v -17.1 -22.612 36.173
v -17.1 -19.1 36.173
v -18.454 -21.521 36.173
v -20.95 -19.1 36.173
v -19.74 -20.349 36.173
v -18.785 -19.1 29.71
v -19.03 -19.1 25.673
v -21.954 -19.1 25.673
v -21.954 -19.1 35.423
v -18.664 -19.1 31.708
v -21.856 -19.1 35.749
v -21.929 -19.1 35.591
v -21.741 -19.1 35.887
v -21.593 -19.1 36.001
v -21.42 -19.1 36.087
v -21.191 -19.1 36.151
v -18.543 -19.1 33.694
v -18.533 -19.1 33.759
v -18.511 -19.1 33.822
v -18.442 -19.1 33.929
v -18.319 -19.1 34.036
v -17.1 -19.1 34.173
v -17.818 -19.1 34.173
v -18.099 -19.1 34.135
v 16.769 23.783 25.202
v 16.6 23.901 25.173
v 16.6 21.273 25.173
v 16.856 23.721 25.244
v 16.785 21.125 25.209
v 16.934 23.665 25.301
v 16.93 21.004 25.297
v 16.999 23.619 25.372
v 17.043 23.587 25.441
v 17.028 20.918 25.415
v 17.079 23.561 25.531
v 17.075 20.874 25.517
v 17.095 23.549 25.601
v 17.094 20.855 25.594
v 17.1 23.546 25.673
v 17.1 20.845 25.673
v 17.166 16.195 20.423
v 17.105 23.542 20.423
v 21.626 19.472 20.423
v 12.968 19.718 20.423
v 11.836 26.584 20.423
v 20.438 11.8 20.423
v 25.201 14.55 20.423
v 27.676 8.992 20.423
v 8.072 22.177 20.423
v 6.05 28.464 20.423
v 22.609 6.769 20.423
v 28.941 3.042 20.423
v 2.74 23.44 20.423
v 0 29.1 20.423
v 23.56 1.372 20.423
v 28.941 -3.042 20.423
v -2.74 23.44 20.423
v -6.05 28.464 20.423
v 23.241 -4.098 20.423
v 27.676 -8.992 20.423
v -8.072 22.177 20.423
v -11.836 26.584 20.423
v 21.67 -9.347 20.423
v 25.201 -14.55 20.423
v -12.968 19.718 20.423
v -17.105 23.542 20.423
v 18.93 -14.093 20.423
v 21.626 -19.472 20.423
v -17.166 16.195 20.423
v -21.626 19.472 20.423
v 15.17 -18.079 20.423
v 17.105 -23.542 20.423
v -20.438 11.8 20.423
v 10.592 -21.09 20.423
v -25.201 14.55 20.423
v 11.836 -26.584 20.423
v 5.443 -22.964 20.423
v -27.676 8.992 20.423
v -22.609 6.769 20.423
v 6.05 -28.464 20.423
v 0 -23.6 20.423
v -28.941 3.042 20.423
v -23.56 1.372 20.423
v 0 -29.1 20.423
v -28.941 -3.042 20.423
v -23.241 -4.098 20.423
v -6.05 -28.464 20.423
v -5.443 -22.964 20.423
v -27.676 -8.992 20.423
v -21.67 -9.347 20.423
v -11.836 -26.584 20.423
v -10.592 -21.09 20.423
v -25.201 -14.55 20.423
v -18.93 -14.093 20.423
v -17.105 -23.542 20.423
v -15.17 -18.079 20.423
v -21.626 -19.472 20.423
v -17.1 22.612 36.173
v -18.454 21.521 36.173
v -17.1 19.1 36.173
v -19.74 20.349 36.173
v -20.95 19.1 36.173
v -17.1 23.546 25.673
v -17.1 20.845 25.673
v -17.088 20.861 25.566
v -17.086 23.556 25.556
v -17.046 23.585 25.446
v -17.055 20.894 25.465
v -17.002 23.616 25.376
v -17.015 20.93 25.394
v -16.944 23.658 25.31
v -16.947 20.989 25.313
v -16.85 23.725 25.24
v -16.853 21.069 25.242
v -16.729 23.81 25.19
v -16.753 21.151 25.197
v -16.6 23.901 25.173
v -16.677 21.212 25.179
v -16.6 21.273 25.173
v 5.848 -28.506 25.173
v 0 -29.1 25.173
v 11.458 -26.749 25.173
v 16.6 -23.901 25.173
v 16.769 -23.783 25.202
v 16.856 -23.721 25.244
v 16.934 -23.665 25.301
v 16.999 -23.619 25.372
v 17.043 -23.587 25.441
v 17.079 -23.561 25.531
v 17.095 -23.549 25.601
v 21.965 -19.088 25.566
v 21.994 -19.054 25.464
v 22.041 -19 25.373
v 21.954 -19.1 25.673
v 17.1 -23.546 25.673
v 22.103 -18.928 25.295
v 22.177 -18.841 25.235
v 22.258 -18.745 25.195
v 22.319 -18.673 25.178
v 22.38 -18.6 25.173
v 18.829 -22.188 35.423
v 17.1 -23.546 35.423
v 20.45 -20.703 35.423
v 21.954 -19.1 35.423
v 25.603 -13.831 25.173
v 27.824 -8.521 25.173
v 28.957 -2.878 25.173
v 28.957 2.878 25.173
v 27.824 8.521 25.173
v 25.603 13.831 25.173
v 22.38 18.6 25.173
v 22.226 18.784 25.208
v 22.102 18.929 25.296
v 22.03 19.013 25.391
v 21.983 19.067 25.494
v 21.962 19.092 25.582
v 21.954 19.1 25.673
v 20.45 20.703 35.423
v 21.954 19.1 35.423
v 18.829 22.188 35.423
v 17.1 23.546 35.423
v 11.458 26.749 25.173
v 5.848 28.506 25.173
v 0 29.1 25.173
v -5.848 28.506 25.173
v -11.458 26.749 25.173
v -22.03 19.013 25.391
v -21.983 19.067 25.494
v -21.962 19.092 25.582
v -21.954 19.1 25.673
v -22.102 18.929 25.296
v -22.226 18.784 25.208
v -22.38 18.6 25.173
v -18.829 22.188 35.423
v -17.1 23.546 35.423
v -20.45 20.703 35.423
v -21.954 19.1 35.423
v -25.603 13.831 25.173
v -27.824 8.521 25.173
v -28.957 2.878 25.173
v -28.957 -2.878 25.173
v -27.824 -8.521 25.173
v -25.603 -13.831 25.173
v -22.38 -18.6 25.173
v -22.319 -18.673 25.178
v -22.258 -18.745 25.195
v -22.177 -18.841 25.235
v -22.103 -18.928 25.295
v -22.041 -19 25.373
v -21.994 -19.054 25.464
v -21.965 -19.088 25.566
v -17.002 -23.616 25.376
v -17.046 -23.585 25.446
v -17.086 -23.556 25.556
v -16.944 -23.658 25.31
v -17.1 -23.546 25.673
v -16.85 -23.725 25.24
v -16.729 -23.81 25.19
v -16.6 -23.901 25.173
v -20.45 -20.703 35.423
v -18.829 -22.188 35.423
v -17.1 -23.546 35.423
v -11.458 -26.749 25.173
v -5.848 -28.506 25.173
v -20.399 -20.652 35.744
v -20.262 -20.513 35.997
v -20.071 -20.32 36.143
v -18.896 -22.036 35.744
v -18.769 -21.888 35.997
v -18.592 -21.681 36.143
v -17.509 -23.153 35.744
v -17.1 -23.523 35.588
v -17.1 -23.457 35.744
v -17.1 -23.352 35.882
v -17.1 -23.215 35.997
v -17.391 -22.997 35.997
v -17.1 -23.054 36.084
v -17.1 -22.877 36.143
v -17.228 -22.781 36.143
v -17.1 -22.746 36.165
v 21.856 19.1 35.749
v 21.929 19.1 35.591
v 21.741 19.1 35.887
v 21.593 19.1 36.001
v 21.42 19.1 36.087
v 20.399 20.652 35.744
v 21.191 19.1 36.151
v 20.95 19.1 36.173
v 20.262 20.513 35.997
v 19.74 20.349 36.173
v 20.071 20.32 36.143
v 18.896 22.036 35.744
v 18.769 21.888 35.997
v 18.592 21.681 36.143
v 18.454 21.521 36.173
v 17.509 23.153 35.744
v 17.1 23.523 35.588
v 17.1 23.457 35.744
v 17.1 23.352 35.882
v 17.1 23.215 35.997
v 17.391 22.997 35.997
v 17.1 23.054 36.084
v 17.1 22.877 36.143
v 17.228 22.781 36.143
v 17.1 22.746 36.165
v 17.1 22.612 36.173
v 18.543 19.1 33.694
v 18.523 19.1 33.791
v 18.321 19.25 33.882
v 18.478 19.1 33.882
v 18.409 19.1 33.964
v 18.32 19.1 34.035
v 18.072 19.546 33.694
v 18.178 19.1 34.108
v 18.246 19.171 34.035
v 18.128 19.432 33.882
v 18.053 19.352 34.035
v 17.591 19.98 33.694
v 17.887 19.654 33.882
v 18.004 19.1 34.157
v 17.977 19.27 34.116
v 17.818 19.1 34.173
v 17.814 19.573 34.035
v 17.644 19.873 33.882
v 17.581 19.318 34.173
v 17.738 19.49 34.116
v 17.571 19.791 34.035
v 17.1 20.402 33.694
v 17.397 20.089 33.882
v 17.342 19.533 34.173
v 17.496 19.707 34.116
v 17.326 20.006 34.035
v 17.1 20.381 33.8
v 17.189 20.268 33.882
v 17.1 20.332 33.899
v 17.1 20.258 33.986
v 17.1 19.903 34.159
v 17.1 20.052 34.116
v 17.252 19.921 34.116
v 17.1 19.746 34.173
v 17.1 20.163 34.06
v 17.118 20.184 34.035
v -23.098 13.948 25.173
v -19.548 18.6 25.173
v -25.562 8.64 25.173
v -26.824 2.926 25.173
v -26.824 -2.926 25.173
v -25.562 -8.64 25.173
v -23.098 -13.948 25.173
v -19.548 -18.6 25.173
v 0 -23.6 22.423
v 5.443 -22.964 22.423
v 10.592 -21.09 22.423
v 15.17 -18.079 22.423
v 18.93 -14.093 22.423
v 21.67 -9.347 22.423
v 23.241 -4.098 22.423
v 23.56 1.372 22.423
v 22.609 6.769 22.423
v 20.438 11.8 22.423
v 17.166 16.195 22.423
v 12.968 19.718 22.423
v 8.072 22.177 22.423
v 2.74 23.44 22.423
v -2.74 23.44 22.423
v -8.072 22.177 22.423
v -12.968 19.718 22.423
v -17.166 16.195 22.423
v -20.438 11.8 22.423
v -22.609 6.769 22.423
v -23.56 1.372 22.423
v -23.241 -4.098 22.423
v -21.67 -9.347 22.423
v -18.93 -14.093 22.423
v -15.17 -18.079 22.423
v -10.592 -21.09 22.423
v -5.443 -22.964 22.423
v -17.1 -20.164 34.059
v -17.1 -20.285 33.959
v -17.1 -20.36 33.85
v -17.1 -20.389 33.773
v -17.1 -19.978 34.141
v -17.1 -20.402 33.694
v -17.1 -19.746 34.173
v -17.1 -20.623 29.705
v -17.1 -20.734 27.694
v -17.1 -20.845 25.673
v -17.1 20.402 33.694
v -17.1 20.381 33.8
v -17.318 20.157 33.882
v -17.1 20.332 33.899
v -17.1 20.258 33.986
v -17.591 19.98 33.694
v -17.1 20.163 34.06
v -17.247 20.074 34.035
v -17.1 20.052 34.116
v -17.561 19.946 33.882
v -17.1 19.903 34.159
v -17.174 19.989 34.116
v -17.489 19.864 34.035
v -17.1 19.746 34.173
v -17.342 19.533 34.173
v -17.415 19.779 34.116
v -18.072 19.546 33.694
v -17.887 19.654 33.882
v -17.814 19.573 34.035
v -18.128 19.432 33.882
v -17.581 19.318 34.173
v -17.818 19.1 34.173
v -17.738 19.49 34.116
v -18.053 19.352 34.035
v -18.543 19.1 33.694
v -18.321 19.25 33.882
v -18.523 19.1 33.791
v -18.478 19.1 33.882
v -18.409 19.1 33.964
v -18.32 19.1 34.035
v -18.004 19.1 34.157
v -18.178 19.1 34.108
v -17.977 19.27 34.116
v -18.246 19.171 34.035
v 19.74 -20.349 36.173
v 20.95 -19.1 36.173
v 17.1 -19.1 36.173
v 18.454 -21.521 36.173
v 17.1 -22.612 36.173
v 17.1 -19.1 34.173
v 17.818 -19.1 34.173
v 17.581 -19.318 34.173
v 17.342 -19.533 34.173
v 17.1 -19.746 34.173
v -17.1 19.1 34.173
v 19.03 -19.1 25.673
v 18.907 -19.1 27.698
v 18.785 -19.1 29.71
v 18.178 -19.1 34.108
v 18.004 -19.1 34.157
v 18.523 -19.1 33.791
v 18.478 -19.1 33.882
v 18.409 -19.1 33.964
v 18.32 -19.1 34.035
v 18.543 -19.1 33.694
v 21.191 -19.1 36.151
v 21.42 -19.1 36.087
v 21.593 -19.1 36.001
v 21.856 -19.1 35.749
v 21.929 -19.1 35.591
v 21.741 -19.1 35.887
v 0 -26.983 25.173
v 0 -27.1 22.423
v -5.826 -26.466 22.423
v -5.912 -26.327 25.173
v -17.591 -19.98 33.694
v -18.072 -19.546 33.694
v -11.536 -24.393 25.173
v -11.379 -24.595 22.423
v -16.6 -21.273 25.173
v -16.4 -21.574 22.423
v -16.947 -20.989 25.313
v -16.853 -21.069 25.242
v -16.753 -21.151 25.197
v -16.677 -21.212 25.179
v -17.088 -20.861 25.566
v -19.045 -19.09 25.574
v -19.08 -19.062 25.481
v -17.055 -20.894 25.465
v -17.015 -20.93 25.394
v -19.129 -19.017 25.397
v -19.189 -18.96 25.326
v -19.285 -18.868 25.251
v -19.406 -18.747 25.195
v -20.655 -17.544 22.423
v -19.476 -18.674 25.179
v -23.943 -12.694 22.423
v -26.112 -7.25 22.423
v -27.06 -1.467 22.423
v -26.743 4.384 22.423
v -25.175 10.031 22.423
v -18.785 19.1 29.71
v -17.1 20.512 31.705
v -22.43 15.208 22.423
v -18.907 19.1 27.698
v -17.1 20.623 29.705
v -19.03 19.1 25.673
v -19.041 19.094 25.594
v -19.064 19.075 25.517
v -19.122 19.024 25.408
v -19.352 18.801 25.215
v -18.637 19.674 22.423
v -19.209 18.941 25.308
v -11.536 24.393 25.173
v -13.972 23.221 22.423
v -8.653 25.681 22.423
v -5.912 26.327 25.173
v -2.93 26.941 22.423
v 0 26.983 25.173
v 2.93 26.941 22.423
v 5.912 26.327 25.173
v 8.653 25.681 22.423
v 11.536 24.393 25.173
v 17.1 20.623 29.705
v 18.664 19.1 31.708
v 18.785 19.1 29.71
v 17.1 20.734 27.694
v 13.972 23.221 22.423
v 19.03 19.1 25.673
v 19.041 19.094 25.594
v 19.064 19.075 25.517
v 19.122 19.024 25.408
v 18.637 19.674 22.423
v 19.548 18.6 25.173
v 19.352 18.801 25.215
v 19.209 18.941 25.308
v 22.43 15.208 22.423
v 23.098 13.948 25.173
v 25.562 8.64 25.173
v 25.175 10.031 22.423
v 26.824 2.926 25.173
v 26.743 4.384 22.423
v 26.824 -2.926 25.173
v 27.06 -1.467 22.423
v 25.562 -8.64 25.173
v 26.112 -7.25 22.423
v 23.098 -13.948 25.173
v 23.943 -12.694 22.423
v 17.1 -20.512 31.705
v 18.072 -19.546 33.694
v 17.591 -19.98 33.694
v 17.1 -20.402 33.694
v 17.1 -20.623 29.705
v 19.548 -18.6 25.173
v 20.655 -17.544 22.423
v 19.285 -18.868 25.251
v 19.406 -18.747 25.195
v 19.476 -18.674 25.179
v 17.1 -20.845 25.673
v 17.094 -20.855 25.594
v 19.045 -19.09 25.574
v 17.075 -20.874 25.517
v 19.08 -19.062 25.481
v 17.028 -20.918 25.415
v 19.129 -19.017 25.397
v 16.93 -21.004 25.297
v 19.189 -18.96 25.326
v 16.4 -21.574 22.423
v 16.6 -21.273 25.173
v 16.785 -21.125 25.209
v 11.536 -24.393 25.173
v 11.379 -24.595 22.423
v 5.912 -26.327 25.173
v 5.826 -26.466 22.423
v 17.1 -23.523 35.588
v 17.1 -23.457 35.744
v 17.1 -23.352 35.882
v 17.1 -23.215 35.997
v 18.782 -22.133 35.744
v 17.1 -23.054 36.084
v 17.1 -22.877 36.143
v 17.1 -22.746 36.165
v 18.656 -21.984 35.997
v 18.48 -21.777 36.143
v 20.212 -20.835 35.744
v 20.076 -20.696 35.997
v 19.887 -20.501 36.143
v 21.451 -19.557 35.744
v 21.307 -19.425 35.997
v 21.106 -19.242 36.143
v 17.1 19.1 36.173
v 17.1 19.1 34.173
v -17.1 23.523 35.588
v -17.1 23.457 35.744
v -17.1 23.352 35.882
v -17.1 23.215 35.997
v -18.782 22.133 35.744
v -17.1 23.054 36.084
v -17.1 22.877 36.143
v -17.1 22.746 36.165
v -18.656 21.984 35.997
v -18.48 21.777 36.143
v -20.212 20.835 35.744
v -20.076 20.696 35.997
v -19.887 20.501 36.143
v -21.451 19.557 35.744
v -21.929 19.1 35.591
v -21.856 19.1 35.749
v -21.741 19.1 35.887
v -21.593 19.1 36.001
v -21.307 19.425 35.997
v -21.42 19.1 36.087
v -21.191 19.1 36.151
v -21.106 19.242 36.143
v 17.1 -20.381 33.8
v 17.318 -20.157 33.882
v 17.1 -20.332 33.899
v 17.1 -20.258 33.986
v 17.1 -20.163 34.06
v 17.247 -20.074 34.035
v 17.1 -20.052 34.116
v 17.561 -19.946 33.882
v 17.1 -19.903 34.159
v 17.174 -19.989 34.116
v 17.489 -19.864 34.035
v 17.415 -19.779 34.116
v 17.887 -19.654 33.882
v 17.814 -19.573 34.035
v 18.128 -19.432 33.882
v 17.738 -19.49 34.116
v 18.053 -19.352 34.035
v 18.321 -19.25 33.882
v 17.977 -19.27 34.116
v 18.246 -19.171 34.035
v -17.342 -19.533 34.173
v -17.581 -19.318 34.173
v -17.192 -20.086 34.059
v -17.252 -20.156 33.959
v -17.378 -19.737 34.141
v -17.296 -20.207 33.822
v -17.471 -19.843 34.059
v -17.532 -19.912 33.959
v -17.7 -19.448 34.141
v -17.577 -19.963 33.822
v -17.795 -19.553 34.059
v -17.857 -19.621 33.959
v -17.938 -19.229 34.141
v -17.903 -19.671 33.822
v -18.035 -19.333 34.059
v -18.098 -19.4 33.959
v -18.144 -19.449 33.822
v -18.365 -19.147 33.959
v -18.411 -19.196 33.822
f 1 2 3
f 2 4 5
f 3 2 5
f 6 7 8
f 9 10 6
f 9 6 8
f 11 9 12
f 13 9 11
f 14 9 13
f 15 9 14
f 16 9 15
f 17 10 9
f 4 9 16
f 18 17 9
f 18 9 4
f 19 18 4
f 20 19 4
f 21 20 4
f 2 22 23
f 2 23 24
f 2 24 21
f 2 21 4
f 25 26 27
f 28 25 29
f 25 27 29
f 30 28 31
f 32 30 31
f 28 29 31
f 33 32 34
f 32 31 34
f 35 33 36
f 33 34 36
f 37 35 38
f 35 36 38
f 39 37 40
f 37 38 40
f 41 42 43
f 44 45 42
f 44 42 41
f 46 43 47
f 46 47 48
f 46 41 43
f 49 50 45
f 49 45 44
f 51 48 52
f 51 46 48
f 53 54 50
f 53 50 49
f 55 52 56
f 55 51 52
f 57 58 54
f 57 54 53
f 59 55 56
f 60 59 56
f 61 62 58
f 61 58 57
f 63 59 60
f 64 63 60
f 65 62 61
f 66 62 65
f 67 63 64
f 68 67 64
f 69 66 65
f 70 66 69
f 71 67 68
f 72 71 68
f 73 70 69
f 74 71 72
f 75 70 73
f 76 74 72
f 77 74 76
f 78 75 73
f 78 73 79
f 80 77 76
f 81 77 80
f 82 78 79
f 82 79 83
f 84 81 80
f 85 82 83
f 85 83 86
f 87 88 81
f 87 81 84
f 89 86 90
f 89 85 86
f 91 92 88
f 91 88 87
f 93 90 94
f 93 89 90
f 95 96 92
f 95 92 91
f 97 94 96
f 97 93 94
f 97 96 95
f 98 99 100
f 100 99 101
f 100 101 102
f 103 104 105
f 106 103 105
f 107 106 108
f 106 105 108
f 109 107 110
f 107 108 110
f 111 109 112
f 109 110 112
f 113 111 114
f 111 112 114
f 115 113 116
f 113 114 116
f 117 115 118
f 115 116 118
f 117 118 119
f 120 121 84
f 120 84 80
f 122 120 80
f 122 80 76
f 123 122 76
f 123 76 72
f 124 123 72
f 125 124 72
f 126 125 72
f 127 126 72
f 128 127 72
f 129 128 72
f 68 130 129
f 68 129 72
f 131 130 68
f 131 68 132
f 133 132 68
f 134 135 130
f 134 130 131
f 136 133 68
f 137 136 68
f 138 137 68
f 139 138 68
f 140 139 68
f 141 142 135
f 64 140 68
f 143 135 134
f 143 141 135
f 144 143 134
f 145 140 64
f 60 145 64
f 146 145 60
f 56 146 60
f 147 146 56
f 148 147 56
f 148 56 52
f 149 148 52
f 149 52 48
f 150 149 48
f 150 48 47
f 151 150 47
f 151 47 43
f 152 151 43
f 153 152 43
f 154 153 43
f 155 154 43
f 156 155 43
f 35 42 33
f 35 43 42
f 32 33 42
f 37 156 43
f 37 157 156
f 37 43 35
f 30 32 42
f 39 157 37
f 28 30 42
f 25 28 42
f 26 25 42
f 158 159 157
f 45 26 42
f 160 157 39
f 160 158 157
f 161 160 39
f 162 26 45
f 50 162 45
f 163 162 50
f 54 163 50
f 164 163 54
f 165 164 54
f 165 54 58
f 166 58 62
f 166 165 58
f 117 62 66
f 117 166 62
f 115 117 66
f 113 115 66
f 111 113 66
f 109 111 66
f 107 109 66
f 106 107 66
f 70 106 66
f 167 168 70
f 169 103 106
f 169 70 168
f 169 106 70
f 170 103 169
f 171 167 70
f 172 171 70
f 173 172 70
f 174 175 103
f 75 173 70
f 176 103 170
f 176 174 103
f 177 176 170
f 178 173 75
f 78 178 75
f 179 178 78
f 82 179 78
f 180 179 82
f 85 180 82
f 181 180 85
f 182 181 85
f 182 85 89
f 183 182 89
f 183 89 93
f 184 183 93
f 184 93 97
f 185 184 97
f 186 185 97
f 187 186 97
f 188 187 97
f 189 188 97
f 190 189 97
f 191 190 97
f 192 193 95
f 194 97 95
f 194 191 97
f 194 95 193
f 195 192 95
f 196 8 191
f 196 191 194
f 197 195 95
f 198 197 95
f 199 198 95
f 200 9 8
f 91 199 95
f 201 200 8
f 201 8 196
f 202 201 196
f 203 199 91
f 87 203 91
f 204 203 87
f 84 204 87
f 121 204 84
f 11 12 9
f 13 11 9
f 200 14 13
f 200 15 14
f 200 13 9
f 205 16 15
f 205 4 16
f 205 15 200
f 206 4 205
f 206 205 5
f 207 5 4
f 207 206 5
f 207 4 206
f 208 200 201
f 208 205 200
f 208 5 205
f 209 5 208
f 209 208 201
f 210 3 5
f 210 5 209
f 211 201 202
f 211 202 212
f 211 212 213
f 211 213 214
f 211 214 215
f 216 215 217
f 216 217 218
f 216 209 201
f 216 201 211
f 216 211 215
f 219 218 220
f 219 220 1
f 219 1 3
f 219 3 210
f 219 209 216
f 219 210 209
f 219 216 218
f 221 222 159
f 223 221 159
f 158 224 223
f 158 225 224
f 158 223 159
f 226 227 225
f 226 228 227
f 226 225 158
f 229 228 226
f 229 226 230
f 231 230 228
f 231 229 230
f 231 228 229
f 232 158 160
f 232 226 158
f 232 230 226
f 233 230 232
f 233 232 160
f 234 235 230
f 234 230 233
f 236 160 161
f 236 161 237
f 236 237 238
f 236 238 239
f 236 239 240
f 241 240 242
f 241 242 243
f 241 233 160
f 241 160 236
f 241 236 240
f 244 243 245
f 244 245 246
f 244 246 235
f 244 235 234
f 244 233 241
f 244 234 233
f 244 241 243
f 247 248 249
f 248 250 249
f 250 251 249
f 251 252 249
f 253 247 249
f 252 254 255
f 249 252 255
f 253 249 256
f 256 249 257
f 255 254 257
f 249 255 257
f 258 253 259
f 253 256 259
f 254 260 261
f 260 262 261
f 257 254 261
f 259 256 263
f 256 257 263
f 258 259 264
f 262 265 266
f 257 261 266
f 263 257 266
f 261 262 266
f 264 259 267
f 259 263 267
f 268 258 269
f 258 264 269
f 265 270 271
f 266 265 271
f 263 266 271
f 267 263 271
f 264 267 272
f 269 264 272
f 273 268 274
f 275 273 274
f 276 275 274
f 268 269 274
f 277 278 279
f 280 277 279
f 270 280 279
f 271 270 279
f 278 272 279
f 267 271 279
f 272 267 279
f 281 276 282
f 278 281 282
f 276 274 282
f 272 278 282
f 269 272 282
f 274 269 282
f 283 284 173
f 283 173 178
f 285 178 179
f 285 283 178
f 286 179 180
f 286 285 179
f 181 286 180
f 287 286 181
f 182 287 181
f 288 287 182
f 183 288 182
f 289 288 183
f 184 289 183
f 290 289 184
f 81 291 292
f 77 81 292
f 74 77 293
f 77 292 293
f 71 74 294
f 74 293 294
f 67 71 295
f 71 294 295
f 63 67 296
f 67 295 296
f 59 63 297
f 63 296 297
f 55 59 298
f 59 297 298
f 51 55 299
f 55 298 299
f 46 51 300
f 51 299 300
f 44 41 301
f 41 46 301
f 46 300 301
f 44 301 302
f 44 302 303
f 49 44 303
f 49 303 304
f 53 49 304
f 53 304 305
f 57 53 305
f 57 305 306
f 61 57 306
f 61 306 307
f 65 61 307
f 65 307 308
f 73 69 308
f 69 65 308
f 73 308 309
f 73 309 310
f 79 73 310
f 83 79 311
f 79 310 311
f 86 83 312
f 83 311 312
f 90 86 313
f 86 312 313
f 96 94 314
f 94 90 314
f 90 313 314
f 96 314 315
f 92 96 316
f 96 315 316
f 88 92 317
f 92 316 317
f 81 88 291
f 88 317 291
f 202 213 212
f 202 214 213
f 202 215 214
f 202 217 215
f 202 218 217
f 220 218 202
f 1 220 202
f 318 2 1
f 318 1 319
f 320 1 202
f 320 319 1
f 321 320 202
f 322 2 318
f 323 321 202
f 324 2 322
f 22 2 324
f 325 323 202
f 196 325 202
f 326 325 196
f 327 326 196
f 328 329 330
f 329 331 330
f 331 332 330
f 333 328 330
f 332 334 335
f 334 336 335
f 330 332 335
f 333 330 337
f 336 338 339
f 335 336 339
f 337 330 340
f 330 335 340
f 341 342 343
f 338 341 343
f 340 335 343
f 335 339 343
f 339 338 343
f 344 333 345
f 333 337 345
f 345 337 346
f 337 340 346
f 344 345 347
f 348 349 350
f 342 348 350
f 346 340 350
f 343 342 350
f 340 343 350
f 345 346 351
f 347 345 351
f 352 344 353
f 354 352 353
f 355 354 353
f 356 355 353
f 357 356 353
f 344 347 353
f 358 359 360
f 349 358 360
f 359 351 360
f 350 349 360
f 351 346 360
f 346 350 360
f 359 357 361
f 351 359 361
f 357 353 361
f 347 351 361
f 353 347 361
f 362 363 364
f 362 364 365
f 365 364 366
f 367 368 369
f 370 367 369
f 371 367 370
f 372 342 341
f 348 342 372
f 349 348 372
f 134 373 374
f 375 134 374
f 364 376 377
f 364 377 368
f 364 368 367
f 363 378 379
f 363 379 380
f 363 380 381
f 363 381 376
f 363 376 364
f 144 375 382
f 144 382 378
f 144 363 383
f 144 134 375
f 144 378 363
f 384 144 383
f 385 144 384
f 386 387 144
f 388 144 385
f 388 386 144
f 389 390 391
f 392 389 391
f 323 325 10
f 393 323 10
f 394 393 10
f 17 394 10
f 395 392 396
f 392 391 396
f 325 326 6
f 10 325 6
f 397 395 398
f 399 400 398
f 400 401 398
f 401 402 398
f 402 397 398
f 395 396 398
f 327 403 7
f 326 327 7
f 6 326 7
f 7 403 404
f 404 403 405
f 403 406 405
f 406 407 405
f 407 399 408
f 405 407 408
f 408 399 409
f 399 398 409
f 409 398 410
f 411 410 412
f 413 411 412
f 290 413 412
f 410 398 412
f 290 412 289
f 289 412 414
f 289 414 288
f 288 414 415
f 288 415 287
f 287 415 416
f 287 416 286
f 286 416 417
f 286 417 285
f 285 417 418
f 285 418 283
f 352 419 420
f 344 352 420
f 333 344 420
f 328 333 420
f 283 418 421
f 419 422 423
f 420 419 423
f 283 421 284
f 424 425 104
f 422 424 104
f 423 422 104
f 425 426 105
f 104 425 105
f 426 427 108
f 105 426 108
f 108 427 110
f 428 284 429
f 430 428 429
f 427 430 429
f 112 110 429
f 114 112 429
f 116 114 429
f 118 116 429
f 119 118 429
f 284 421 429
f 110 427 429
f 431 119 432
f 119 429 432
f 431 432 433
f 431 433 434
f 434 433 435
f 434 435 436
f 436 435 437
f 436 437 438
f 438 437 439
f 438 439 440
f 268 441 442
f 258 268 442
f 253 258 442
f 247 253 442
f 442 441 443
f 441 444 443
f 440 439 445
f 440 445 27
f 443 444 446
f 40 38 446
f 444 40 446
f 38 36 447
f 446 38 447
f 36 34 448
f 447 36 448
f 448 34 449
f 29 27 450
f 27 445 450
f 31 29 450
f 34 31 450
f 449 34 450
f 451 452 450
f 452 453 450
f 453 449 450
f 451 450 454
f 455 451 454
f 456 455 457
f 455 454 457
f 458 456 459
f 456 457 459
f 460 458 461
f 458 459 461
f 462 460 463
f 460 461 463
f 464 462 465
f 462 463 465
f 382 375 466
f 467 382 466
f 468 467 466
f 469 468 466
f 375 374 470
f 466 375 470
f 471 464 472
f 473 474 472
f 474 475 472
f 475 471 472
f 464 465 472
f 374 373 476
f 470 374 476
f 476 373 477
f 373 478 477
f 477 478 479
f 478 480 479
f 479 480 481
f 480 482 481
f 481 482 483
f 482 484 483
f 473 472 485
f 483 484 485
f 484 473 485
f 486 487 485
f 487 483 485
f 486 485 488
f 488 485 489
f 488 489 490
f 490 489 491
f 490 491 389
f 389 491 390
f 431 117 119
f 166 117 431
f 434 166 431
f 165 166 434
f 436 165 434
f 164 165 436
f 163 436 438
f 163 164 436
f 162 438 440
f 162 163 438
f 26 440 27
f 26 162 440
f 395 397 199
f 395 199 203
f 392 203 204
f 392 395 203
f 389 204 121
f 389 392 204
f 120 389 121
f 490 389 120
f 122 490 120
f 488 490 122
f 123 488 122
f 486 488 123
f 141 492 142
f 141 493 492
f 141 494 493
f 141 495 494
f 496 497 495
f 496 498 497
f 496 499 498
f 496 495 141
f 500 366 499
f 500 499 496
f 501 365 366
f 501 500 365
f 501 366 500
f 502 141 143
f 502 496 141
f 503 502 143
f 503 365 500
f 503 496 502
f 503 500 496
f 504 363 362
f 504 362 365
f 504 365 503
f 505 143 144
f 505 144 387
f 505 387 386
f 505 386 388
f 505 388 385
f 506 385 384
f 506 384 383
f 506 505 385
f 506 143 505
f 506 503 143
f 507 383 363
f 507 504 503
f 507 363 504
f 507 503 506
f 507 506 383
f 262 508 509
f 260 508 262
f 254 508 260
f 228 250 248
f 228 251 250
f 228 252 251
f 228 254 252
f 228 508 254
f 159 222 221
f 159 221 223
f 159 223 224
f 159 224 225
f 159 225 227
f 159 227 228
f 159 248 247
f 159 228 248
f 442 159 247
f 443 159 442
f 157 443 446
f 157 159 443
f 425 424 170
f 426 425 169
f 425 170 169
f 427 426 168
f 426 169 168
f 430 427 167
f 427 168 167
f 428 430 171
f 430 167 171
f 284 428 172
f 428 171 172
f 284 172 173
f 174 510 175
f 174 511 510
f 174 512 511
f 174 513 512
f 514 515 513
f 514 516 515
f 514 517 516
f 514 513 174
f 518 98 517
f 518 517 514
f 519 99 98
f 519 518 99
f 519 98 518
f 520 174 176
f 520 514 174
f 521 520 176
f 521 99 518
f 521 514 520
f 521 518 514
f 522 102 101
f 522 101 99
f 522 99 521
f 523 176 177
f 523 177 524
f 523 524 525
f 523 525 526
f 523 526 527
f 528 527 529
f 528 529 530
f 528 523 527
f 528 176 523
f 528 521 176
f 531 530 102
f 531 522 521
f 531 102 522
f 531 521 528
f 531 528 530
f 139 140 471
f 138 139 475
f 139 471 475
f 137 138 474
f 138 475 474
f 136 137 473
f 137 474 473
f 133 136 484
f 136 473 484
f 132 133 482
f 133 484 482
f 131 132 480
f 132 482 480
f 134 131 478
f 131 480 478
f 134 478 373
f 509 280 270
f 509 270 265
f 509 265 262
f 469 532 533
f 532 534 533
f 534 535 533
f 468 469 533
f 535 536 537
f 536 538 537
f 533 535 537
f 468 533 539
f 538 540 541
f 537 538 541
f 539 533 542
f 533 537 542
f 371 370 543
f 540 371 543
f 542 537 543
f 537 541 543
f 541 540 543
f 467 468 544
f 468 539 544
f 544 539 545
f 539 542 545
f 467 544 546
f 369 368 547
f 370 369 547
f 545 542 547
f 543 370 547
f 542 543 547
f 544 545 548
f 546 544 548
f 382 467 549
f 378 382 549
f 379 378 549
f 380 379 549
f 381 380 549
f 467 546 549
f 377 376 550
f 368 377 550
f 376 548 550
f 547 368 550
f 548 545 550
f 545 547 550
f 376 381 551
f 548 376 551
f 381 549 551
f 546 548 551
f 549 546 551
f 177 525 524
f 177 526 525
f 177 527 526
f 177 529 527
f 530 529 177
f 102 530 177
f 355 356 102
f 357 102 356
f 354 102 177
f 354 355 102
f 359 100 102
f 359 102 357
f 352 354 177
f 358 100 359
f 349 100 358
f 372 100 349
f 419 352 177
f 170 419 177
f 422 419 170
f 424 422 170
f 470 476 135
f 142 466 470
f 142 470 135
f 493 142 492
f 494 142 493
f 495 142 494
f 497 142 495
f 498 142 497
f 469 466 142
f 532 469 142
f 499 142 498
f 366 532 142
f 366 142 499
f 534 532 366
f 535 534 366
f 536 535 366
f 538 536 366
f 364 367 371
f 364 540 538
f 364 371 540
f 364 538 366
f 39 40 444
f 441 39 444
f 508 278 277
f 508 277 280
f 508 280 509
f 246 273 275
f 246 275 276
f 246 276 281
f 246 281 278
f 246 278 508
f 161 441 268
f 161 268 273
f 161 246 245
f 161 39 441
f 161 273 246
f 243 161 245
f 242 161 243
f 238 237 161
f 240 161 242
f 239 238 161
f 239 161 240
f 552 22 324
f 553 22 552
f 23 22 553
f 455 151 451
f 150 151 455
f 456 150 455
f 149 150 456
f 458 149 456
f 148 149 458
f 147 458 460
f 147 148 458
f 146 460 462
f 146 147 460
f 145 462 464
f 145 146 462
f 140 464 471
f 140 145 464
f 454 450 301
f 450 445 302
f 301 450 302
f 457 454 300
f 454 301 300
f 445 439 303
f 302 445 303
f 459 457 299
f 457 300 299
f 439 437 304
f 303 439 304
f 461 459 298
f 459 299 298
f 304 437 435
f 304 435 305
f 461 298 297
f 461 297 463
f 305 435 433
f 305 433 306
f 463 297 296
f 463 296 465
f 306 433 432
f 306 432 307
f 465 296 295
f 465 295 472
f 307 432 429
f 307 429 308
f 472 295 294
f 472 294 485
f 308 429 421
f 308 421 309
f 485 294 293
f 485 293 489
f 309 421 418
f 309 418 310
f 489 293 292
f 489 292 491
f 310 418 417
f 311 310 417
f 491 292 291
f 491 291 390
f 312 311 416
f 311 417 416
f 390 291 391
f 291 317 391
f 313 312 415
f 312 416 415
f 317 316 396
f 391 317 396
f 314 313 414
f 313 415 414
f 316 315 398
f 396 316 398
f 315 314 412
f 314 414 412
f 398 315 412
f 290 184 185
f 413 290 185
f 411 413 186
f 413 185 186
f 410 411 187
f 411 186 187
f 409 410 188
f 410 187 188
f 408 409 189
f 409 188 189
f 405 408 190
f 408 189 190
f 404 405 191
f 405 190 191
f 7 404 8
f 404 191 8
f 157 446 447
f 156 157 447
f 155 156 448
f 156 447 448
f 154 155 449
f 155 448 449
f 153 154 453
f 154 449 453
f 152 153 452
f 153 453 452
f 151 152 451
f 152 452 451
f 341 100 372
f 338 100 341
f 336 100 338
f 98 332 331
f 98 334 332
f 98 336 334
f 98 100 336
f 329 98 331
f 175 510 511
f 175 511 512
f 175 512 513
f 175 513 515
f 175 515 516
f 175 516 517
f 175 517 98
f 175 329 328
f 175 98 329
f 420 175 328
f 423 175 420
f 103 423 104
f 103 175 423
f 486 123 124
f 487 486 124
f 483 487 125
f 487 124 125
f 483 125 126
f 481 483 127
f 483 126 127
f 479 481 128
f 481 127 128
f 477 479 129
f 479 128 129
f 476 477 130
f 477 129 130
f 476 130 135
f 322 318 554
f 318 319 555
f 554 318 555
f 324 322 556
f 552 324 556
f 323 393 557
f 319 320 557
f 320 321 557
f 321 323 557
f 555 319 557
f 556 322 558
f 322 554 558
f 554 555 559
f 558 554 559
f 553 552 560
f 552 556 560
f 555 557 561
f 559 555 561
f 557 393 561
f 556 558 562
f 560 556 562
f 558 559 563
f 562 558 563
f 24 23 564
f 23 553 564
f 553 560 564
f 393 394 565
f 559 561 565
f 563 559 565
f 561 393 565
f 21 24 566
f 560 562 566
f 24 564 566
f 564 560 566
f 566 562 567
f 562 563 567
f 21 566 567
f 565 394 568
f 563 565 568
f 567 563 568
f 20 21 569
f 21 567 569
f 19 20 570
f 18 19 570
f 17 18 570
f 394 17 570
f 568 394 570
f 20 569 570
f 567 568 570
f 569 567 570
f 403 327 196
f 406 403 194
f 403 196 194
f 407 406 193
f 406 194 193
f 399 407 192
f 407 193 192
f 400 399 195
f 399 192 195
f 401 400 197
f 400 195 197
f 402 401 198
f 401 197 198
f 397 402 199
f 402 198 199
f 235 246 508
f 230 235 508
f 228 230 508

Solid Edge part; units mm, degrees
sketch "Sketch1" plane through (0, 0, 0) normal (-1, 0, 0) x (0, -1, 0)
  line L0 (23.6, 20.423) -> (29.1, 20.423)
  line L1 (29.1, 20.423) -> (29.1, 22.423)
  line L2 (29.1, 22.423) -> (29.1, 36.173)
  line L3 (29.1, 36.173) -> (24.6, 36.173)
  line L4 (24.6, 36.173) -> (24.6, 34.173)
  line L5 (24.6, 34.173) -> (26.6, 34.173)
  line L6 (26.6, 34.173) -> (27.1, 22.423)
  line L7 (23.6, 22.423) -> (27.1, 22.423)
  line L8 (23.6, 20.423) -> (23.6, 22.423)
  dimension "D1" = 13.75
  dimension "D2" = 2
  dimension "D3" = 5.5
  dimension "D4" = 2
  dimension "D5" = 2
  dimension "D6" = 4.5
  dimension "D7" = 2
  dimension "D8" = 3.5
  dimension "D9" = 23.6
  dimension "D10" = 11.75
revolve "Rotationsausprägung_1" add sketch "Sketch1" angle 360 about axis through (0, 0, 57) along (0, 0, -1)
sketch "Sketch2" plane through (0, 0, 0) normal (-1, 0, 0) x (0, -1, 0)
  line L0 (-19.1, 36.173) -> (-19.1, 25.173)
  line L1 (-19.1, 25.173) -> (19.1, 25.173)
  line L2 (19.1, 25.173) -> (19.1, 36.173)
  line L3 (19.1, 36.173) -> (-19.1, 36.173)
  dimension "D1" = 10
  dimension "D2" = 10
  dimension "D3" = 11
extrude "Cutout1" cut sketch "Sketch2" along normal mid plane 75
sketch "Sketch3" plane through (0, 0, 0) normal (0, -1, 0) x (1, 0, 0)
  line L0 (-17.1, 36.173) -> (-17.1, 25.173)
  line L1 (-17.1, 25.173) -> (17.1, 25.173)
  line L2 (17.1, 25.173) -> (17.1, 36.173)
  line L3 (17.1, 36.173) -> (-17.1, 36.173)
  dimension "D1" = 11
  dimension "D2" = 12
  dimension "D3" = 12
extrude "Extrusionsausschnitt_2" cut sketch "Sketch3" along normal mid plane 75
fillet "Verrundung_0_75_mm" radius 0.75 4 edges at (-19.6534, -21.4606, 36.173) (19.6534, -21.4606, 36.173) (19.6534, 21.4606, 36.173) (-19.6534, 21.4606, 36.173)
fillet "Verrundung_0_5_mm" radius 0.5 12 edges at (-17.8182, 19.7503, 34.173) (-20.5071, 19.1, 25.173) (-17.1, 22.2092, 25.173) (-17.1, -22.2092, 25.173) (-20.5071, -19.1, 25.173) (-17.8182, -19.7503, 34.173) (20.5071, -19.1, 25.173) (17.1, -22.2092, 25.173) (17.8182, -19.7503, 34.173) (17.8182, 19.7503, 34.173) (17.1, 22.2092, 25.173) (20.5071, 19.1, 25.173)
